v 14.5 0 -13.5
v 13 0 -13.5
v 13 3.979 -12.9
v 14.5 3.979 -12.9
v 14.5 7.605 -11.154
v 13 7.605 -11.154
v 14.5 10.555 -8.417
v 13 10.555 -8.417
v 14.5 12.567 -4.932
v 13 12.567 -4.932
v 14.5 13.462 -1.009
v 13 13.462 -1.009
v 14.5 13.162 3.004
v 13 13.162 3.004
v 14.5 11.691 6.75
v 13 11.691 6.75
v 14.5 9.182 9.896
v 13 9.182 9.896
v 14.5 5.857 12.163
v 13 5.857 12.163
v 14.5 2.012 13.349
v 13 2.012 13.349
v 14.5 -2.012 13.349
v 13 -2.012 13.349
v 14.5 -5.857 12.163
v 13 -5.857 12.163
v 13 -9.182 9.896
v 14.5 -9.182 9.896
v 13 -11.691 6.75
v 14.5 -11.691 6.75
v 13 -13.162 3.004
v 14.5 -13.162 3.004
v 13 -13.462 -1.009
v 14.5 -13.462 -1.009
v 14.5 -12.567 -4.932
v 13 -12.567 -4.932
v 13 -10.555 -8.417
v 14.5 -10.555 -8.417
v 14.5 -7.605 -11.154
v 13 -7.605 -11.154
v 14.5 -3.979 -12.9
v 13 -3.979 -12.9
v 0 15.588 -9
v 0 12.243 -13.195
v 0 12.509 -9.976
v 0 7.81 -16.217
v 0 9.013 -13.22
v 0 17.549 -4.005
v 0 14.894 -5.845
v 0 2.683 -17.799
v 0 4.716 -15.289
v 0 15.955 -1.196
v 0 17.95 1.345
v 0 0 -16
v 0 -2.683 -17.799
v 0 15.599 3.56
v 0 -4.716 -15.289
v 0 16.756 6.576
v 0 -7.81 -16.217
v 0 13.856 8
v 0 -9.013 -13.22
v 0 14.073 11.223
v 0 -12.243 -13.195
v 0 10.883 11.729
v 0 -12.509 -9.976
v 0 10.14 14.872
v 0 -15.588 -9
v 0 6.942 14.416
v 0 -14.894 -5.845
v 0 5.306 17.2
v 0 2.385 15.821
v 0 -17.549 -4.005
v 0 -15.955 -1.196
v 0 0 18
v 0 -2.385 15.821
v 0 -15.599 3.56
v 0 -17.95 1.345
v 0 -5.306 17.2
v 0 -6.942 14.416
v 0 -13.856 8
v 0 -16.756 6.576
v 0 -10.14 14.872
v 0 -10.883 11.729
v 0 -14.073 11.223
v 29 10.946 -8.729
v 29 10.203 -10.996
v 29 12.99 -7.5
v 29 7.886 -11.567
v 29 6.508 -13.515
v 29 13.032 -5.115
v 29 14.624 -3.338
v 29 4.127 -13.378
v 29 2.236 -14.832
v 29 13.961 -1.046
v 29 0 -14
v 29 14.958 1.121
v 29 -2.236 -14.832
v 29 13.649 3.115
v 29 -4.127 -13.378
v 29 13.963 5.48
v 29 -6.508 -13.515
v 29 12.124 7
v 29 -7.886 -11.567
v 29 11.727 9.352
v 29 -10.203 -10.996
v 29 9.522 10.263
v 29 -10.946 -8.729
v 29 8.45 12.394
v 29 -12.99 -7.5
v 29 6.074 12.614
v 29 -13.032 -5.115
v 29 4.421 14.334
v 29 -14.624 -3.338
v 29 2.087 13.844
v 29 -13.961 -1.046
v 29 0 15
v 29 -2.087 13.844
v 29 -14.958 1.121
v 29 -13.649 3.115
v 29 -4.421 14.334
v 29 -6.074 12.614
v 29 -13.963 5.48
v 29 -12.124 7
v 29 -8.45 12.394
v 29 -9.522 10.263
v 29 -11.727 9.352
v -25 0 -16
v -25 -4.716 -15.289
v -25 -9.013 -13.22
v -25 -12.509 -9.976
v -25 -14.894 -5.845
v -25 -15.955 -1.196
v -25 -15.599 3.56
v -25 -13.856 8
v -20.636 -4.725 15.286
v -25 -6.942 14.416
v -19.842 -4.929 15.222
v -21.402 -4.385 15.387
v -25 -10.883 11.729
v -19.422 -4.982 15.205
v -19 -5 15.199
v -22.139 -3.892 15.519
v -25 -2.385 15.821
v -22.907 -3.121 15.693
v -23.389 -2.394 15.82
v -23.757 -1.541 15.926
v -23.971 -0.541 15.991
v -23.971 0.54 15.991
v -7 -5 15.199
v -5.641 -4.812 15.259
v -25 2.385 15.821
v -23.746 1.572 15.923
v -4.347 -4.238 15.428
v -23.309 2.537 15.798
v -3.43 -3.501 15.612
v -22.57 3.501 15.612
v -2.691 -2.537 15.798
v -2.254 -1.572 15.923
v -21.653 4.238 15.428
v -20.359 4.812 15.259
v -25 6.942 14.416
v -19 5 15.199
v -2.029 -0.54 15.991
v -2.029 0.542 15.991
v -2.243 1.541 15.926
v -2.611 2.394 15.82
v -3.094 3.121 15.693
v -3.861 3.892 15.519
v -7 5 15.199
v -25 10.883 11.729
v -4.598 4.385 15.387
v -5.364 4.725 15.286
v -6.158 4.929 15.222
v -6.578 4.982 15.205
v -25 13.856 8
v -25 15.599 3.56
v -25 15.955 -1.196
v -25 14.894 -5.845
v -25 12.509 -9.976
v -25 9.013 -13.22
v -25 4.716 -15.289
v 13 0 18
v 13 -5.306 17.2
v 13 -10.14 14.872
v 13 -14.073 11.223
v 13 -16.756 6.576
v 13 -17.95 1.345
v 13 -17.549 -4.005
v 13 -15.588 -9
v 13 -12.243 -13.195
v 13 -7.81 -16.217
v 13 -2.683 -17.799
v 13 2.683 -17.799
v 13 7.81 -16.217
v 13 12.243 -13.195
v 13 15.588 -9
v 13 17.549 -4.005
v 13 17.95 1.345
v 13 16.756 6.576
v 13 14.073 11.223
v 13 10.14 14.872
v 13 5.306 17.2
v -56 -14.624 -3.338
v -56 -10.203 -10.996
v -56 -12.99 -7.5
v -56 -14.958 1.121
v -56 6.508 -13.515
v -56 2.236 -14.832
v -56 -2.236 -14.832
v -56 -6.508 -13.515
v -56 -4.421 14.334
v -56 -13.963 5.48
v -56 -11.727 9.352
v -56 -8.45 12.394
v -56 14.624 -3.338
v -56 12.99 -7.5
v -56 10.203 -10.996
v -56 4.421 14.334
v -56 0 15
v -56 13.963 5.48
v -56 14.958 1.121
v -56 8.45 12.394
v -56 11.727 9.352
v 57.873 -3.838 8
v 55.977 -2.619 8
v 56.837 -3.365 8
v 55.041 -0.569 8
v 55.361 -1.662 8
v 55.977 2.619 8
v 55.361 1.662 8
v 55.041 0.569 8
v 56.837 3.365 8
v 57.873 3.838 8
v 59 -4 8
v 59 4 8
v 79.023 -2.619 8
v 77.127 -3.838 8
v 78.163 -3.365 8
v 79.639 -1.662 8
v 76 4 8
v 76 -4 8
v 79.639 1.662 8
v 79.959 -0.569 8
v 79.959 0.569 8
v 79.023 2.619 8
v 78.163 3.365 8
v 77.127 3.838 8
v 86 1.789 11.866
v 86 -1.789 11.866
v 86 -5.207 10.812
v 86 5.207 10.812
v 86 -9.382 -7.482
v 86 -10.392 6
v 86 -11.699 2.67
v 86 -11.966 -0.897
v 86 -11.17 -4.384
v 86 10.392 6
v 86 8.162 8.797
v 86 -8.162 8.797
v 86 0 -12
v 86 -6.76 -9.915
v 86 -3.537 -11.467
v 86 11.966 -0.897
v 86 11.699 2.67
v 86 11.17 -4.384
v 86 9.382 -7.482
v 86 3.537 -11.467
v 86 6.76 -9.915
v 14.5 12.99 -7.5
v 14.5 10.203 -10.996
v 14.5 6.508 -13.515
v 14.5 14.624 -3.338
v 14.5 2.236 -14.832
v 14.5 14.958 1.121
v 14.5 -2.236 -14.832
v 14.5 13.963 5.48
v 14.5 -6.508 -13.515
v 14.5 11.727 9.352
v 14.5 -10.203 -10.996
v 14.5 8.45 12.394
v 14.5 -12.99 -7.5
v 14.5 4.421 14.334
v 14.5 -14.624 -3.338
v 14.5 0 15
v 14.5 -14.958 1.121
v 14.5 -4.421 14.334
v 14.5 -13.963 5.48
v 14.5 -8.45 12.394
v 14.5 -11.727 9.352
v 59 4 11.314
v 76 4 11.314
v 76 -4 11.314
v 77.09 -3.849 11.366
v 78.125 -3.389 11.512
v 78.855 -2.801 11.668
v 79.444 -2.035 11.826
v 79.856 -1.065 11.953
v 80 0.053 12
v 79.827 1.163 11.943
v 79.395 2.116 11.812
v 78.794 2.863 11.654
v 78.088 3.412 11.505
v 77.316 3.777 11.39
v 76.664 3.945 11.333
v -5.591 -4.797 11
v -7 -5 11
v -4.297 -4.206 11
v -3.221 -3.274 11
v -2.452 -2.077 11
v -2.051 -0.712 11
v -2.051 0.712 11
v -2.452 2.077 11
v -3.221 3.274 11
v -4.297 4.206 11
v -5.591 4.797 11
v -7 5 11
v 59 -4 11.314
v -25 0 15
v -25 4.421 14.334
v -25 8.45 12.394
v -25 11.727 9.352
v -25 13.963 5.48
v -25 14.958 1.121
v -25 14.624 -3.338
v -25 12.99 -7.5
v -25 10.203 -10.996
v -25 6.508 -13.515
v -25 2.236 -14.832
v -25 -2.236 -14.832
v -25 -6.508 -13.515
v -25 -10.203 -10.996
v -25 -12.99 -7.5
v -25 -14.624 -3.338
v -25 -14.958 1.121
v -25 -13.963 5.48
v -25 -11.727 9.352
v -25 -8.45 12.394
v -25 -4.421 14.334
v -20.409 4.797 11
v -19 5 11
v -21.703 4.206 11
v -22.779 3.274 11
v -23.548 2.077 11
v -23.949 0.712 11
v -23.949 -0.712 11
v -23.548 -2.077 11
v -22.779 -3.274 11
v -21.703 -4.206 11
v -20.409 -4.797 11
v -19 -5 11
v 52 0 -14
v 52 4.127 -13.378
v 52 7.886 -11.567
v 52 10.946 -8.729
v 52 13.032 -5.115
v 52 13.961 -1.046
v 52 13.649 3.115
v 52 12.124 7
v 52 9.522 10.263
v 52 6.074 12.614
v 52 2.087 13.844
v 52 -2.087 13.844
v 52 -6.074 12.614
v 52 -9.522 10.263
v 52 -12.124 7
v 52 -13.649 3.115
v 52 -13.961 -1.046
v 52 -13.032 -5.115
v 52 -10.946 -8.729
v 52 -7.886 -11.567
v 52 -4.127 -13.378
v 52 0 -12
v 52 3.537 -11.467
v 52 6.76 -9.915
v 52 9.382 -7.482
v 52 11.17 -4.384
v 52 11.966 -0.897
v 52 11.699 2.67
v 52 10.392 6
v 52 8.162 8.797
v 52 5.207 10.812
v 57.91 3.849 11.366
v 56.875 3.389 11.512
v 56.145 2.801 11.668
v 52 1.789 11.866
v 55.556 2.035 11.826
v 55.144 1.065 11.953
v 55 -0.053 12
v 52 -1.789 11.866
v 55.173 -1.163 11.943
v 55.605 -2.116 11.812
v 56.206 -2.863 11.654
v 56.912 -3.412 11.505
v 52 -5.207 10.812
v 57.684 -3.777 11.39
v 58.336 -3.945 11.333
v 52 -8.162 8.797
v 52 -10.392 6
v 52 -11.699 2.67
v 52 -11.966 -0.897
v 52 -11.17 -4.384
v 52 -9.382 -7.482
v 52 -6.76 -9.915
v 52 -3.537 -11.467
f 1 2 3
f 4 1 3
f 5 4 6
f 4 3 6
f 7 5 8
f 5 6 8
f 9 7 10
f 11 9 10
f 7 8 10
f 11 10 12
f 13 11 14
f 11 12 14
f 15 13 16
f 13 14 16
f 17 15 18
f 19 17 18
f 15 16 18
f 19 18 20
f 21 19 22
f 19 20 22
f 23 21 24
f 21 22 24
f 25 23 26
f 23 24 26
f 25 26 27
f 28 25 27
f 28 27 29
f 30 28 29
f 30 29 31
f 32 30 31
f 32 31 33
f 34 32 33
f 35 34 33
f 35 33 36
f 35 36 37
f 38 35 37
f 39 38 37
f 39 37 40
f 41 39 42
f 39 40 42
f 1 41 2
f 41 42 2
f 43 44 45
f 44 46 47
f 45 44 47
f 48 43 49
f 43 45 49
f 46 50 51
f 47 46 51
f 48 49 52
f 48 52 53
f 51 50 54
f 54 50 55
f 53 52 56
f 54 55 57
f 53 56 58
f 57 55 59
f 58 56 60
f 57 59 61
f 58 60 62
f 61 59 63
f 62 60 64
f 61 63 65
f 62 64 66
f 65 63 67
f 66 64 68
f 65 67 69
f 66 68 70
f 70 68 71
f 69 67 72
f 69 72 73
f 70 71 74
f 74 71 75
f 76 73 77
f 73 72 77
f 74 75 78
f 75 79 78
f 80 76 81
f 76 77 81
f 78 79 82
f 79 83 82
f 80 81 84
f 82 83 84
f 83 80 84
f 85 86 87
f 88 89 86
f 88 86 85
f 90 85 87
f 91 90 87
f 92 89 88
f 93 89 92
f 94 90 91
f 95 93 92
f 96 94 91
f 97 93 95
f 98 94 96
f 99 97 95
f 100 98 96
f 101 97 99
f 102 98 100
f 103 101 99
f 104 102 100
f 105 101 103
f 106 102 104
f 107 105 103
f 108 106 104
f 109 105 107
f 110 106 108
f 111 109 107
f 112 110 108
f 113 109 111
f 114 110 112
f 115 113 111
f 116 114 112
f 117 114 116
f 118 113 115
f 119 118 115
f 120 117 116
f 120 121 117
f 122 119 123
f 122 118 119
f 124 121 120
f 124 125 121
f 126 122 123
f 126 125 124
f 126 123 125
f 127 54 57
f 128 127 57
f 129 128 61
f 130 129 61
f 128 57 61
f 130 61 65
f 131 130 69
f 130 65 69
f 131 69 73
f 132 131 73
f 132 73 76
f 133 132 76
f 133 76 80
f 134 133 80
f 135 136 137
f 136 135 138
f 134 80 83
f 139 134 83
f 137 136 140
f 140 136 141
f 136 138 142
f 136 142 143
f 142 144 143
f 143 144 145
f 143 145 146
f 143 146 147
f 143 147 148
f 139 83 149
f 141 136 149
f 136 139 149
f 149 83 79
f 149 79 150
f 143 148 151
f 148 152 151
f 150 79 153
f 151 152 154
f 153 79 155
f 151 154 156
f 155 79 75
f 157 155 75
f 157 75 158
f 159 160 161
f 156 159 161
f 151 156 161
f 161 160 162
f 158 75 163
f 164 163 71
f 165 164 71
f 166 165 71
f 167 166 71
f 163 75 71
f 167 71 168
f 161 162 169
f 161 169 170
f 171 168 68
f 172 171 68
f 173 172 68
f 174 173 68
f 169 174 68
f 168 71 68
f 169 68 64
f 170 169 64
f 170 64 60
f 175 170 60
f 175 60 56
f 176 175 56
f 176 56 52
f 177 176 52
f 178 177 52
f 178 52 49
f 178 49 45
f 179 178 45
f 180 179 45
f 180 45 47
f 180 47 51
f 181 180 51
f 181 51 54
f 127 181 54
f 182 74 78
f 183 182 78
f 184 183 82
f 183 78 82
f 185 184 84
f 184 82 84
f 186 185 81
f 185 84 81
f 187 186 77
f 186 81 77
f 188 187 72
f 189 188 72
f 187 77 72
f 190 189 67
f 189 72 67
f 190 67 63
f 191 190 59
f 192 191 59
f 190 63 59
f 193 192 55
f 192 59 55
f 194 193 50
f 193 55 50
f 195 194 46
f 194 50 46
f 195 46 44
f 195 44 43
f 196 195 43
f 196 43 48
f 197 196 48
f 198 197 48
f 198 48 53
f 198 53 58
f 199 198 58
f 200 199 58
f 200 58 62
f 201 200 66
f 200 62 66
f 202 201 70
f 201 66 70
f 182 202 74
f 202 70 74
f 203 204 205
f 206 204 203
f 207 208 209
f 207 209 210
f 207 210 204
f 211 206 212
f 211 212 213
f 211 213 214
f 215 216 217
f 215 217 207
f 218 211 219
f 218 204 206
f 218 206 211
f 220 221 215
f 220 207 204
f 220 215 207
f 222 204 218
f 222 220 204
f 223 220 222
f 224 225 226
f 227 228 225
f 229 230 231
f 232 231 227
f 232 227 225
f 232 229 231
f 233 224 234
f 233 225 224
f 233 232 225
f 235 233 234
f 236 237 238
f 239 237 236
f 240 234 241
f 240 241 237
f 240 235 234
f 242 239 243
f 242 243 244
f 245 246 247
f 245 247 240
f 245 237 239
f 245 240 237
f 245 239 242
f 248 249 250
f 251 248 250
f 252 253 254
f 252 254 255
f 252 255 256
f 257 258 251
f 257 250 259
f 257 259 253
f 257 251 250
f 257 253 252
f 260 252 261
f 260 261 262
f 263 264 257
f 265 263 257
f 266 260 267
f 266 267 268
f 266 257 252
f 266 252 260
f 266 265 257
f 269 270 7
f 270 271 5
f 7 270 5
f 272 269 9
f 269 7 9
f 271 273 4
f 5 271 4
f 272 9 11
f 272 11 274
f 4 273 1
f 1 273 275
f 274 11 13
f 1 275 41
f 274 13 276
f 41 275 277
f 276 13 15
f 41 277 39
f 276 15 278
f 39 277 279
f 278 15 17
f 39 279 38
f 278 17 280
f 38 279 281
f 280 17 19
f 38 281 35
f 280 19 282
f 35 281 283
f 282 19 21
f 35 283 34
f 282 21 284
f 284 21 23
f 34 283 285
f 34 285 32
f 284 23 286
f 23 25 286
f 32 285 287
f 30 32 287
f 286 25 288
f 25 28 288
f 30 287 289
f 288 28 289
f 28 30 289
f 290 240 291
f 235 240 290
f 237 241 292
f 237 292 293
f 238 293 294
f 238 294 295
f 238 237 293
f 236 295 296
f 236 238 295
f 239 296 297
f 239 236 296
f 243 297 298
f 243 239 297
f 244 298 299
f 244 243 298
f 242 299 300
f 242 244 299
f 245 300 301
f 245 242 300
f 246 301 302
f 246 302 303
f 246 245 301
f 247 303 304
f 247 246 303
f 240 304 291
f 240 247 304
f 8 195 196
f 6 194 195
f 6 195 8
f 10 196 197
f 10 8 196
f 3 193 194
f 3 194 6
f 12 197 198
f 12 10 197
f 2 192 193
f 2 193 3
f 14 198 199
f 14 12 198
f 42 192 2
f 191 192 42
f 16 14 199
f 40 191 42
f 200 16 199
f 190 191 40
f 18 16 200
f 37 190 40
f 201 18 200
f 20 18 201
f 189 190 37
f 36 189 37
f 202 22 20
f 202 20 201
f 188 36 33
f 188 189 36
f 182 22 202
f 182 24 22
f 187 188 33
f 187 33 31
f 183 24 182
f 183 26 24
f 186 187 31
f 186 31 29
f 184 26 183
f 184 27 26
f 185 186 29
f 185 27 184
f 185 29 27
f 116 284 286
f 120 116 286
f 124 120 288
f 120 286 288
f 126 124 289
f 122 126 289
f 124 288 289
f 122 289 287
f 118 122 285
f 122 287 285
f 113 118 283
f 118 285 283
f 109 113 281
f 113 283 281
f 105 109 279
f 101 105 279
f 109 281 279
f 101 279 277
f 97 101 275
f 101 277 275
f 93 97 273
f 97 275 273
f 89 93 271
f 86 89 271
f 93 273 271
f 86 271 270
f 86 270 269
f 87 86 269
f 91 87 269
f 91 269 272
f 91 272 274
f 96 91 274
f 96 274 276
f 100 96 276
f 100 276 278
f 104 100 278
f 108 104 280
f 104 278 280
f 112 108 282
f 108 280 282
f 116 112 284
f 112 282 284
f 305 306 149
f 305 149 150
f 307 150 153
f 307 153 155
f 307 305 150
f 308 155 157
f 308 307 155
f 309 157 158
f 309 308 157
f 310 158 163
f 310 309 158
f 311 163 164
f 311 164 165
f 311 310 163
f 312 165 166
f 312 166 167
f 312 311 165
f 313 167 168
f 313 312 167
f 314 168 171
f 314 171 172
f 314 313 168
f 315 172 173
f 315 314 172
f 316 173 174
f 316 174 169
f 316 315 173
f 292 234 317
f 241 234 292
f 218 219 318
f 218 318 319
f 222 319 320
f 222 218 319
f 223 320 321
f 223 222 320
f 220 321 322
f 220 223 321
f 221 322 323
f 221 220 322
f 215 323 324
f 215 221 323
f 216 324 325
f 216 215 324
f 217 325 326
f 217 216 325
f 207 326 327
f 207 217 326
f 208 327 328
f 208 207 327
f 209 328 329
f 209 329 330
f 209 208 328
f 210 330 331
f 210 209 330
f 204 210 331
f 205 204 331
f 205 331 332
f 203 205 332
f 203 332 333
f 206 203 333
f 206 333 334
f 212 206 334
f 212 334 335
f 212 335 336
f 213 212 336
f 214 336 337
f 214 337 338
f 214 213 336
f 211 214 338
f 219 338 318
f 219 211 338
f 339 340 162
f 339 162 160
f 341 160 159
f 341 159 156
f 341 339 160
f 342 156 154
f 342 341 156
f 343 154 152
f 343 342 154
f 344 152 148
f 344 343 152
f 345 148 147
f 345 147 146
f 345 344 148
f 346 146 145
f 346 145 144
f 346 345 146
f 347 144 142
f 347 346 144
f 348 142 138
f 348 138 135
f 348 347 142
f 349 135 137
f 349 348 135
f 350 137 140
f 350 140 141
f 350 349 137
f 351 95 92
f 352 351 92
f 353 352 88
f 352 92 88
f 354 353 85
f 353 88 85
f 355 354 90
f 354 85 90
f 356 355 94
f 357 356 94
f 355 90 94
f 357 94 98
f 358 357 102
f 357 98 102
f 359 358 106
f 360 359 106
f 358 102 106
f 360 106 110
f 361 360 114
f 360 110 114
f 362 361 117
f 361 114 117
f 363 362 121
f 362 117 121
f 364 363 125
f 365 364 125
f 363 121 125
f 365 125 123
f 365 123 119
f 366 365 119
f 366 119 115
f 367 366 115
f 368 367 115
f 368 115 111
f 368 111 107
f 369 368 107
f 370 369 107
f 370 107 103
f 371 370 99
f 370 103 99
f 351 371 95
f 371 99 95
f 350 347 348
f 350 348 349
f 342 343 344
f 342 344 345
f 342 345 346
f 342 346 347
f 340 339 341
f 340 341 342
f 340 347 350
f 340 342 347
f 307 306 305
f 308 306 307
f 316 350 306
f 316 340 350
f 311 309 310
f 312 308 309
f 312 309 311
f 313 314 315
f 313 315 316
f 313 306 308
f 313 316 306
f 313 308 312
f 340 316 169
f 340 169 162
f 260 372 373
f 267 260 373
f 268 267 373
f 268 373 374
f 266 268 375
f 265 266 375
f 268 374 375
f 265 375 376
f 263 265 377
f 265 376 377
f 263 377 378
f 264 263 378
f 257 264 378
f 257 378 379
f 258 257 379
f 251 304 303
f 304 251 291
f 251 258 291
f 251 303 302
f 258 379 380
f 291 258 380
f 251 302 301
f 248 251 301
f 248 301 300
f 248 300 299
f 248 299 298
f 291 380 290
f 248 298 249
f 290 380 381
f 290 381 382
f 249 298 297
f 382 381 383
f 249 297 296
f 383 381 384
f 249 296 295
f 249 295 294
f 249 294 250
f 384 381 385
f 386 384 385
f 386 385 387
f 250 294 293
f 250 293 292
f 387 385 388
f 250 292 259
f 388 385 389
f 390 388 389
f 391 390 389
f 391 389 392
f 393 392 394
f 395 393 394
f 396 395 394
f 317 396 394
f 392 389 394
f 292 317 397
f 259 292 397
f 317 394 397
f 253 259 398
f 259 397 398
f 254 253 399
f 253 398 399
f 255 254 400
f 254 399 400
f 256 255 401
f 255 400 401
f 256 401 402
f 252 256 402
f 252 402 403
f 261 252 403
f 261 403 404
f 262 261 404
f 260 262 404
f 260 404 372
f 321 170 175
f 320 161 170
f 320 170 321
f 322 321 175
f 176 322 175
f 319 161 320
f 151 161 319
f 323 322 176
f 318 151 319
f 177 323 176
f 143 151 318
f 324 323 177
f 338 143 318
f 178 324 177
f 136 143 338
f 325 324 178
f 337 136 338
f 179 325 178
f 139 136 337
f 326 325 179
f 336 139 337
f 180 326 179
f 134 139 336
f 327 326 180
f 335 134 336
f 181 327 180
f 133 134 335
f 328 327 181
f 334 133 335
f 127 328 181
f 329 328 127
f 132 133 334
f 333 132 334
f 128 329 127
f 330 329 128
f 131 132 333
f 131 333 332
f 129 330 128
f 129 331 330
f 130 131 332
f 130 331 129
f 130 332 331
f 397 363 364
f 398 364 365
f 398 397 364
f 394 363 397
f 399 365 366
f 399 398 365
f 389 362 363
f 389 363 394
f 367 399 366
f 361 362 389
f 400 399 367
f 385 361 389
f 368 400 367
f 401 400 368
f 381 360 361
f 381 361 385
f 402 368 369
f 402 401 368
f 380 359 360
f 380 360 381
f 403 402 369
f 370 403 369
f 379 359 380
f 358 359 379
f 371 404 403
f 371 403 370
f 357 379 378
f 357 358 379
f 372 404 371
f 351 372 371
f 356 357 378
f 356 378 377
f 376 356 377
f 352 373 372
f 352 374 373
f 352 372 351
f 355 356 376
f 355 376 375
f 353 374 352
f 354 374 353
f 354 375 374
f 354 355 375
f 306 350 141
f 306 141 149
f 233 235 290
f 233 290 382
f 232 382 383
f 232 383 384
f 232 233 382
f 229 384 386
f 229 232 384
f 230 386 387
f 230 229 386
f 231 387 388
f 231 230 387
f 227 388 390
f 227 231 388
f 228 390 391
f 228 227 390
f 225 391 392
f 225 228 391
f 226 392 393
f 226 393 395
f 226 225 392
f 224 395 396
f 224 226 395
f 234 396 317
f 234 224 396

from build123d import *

# Parameters (mm, degrees)
SKETCH_1_R          = 18
EXTRUDE_1_DEPTH     = 13
SKETCH_2_R          = 13.5
EXTRUDE_2_DEPTH     = 1.5
SKETCH_3_R          = 15
EXTRUDE_3_DEPTH     = 14.5
SKETCH_4_R          = 14
EXTRUDE_4_DEPTH     = 23
SKETCH_5_R          = 12
EXTRUDE_5_DEPTH     = 34
SKETCH_6_R          = 16
EXTRUDE_6_DEPTH     = 25
EXTRUDE_START       = 31
SKETCH_7_R          = 15
EXTRUDE_7_DEPTH     = 31
CUT_EXTRUDE_START   = 11
CUT_EXTRUDE_1_DEPTH = 31
CUT_EXTRUDE_START_2 = 8
CUT_EXTRUDE_2_DEPTH = 31


with BuildPart() as part:
    # 草图1 → 凸台-拉伸1 (new body)
    with BuildSketch(Plane(origin=(0, 0, 0), x_dir=(0, 0, -1), z_dir=(1, 0, 0))):
        with Locations(Location((0, 0, 0), (0, 0, 180))):
            Circle(SKETCH_1_R)
    extrude(amount=EXTRUDE_1_DEPTH)

    # 草图2 → 凸台-拉伸2 (add)
    with BuildSketch(Plane(origin=(13, 0, 0), x_dir=(0, 0, -1), z_dir=(1, 0, 0))):
        Circle(SKETCH_2_R)
    extrude(amount=EXTRUDE_2_DEPTH)

    # 草图3 → 凸台-拉伸3 (add)
    with BuildSketch(Plane(origin=(14.5, 0, 0), x_dir=(0, 0, -1), z_dir=(1, 0, 0))):
        with Locations(Location((0, 0, 0), (0, 0, 180))):
            Circle(SKETCH_3_R)
    extrude(amount=EXTRUDE_3_DEPTH)

    # 草图4 → 凸台-拉伸4 (add)
    with BuildSketch(Plane(origin=(29, 0, 0), x_dir=(0, 0, -1), z_dir=(1, 0, 0))):
        Circle(SKETCH_4_R)
    extrude(amount=EXTRUDE_4_DEPTH)

    # 草图5 → 凸台-拉伸5 (add)
    with BuildSketch(Plane(origin=(52, 0, 0), x_dir=(0, 0, -1), z_dir=(1, 0, 0))):
        Circle(SKETCH_5_R)
    extrude(amount=EXTRUDE_5_DEPTH)

    # 草图6 → 凸台-拉伸6 (add)
    with BuildSketch(Plane.ZY):
        with Locations(Location((0, 0, 0), (0, 0, 180))):
            Circle(SKETCH_6_R)
    extrude(amount=EXTRUDE_6_DEPTH)

    # 草图7 → 凸台-拉伸7 (add)
    with BuildSketch(Plane.ZY.offset(25).offset(EXTRUDE_START)):
        Circle(SKETCH_7_R)
    extrude(amount=-EXTRUDE_7_DEPTH)

    # 草图8 → 切除-拉伸1 (cut)
    with BuildSketch(Plane.XY.offset(CUT_EXTRUDE_START)):
        with BuildLine():
            Line((-19, -5), (-7, -5))
            ThreePointArc((-7, -5), (-2, 0), (-7, 5))
            Line((-7, 5), (-19, 5))
            ThreePointArc((-19, 5), (-24, 0), (-19, -5))
        make_face()
    extrude(amount=CUT_EXTRUDE_1_DEPTH, mode=Mode.SUBTRACT)

    # 草图9 → 切除-拉伸2 (cut)
    with BuildSketch(Plane.XY.offset(CUT_EXTRUDE_START_2)):
        with BuildLine():
            Line((59, -4), (76, -4))
            ThreePointArc((76, -4), (80, 0), (76, 4))
            Line((76, 4), (59, 4))
            ThreePointArc((59, 4), (55, 0), (59, -4))
        make_face()
    extrude(amount=CUT_EXTRUDE_2_DEPTH, mode=Mode.SUBTRACT)


solid = part.part
